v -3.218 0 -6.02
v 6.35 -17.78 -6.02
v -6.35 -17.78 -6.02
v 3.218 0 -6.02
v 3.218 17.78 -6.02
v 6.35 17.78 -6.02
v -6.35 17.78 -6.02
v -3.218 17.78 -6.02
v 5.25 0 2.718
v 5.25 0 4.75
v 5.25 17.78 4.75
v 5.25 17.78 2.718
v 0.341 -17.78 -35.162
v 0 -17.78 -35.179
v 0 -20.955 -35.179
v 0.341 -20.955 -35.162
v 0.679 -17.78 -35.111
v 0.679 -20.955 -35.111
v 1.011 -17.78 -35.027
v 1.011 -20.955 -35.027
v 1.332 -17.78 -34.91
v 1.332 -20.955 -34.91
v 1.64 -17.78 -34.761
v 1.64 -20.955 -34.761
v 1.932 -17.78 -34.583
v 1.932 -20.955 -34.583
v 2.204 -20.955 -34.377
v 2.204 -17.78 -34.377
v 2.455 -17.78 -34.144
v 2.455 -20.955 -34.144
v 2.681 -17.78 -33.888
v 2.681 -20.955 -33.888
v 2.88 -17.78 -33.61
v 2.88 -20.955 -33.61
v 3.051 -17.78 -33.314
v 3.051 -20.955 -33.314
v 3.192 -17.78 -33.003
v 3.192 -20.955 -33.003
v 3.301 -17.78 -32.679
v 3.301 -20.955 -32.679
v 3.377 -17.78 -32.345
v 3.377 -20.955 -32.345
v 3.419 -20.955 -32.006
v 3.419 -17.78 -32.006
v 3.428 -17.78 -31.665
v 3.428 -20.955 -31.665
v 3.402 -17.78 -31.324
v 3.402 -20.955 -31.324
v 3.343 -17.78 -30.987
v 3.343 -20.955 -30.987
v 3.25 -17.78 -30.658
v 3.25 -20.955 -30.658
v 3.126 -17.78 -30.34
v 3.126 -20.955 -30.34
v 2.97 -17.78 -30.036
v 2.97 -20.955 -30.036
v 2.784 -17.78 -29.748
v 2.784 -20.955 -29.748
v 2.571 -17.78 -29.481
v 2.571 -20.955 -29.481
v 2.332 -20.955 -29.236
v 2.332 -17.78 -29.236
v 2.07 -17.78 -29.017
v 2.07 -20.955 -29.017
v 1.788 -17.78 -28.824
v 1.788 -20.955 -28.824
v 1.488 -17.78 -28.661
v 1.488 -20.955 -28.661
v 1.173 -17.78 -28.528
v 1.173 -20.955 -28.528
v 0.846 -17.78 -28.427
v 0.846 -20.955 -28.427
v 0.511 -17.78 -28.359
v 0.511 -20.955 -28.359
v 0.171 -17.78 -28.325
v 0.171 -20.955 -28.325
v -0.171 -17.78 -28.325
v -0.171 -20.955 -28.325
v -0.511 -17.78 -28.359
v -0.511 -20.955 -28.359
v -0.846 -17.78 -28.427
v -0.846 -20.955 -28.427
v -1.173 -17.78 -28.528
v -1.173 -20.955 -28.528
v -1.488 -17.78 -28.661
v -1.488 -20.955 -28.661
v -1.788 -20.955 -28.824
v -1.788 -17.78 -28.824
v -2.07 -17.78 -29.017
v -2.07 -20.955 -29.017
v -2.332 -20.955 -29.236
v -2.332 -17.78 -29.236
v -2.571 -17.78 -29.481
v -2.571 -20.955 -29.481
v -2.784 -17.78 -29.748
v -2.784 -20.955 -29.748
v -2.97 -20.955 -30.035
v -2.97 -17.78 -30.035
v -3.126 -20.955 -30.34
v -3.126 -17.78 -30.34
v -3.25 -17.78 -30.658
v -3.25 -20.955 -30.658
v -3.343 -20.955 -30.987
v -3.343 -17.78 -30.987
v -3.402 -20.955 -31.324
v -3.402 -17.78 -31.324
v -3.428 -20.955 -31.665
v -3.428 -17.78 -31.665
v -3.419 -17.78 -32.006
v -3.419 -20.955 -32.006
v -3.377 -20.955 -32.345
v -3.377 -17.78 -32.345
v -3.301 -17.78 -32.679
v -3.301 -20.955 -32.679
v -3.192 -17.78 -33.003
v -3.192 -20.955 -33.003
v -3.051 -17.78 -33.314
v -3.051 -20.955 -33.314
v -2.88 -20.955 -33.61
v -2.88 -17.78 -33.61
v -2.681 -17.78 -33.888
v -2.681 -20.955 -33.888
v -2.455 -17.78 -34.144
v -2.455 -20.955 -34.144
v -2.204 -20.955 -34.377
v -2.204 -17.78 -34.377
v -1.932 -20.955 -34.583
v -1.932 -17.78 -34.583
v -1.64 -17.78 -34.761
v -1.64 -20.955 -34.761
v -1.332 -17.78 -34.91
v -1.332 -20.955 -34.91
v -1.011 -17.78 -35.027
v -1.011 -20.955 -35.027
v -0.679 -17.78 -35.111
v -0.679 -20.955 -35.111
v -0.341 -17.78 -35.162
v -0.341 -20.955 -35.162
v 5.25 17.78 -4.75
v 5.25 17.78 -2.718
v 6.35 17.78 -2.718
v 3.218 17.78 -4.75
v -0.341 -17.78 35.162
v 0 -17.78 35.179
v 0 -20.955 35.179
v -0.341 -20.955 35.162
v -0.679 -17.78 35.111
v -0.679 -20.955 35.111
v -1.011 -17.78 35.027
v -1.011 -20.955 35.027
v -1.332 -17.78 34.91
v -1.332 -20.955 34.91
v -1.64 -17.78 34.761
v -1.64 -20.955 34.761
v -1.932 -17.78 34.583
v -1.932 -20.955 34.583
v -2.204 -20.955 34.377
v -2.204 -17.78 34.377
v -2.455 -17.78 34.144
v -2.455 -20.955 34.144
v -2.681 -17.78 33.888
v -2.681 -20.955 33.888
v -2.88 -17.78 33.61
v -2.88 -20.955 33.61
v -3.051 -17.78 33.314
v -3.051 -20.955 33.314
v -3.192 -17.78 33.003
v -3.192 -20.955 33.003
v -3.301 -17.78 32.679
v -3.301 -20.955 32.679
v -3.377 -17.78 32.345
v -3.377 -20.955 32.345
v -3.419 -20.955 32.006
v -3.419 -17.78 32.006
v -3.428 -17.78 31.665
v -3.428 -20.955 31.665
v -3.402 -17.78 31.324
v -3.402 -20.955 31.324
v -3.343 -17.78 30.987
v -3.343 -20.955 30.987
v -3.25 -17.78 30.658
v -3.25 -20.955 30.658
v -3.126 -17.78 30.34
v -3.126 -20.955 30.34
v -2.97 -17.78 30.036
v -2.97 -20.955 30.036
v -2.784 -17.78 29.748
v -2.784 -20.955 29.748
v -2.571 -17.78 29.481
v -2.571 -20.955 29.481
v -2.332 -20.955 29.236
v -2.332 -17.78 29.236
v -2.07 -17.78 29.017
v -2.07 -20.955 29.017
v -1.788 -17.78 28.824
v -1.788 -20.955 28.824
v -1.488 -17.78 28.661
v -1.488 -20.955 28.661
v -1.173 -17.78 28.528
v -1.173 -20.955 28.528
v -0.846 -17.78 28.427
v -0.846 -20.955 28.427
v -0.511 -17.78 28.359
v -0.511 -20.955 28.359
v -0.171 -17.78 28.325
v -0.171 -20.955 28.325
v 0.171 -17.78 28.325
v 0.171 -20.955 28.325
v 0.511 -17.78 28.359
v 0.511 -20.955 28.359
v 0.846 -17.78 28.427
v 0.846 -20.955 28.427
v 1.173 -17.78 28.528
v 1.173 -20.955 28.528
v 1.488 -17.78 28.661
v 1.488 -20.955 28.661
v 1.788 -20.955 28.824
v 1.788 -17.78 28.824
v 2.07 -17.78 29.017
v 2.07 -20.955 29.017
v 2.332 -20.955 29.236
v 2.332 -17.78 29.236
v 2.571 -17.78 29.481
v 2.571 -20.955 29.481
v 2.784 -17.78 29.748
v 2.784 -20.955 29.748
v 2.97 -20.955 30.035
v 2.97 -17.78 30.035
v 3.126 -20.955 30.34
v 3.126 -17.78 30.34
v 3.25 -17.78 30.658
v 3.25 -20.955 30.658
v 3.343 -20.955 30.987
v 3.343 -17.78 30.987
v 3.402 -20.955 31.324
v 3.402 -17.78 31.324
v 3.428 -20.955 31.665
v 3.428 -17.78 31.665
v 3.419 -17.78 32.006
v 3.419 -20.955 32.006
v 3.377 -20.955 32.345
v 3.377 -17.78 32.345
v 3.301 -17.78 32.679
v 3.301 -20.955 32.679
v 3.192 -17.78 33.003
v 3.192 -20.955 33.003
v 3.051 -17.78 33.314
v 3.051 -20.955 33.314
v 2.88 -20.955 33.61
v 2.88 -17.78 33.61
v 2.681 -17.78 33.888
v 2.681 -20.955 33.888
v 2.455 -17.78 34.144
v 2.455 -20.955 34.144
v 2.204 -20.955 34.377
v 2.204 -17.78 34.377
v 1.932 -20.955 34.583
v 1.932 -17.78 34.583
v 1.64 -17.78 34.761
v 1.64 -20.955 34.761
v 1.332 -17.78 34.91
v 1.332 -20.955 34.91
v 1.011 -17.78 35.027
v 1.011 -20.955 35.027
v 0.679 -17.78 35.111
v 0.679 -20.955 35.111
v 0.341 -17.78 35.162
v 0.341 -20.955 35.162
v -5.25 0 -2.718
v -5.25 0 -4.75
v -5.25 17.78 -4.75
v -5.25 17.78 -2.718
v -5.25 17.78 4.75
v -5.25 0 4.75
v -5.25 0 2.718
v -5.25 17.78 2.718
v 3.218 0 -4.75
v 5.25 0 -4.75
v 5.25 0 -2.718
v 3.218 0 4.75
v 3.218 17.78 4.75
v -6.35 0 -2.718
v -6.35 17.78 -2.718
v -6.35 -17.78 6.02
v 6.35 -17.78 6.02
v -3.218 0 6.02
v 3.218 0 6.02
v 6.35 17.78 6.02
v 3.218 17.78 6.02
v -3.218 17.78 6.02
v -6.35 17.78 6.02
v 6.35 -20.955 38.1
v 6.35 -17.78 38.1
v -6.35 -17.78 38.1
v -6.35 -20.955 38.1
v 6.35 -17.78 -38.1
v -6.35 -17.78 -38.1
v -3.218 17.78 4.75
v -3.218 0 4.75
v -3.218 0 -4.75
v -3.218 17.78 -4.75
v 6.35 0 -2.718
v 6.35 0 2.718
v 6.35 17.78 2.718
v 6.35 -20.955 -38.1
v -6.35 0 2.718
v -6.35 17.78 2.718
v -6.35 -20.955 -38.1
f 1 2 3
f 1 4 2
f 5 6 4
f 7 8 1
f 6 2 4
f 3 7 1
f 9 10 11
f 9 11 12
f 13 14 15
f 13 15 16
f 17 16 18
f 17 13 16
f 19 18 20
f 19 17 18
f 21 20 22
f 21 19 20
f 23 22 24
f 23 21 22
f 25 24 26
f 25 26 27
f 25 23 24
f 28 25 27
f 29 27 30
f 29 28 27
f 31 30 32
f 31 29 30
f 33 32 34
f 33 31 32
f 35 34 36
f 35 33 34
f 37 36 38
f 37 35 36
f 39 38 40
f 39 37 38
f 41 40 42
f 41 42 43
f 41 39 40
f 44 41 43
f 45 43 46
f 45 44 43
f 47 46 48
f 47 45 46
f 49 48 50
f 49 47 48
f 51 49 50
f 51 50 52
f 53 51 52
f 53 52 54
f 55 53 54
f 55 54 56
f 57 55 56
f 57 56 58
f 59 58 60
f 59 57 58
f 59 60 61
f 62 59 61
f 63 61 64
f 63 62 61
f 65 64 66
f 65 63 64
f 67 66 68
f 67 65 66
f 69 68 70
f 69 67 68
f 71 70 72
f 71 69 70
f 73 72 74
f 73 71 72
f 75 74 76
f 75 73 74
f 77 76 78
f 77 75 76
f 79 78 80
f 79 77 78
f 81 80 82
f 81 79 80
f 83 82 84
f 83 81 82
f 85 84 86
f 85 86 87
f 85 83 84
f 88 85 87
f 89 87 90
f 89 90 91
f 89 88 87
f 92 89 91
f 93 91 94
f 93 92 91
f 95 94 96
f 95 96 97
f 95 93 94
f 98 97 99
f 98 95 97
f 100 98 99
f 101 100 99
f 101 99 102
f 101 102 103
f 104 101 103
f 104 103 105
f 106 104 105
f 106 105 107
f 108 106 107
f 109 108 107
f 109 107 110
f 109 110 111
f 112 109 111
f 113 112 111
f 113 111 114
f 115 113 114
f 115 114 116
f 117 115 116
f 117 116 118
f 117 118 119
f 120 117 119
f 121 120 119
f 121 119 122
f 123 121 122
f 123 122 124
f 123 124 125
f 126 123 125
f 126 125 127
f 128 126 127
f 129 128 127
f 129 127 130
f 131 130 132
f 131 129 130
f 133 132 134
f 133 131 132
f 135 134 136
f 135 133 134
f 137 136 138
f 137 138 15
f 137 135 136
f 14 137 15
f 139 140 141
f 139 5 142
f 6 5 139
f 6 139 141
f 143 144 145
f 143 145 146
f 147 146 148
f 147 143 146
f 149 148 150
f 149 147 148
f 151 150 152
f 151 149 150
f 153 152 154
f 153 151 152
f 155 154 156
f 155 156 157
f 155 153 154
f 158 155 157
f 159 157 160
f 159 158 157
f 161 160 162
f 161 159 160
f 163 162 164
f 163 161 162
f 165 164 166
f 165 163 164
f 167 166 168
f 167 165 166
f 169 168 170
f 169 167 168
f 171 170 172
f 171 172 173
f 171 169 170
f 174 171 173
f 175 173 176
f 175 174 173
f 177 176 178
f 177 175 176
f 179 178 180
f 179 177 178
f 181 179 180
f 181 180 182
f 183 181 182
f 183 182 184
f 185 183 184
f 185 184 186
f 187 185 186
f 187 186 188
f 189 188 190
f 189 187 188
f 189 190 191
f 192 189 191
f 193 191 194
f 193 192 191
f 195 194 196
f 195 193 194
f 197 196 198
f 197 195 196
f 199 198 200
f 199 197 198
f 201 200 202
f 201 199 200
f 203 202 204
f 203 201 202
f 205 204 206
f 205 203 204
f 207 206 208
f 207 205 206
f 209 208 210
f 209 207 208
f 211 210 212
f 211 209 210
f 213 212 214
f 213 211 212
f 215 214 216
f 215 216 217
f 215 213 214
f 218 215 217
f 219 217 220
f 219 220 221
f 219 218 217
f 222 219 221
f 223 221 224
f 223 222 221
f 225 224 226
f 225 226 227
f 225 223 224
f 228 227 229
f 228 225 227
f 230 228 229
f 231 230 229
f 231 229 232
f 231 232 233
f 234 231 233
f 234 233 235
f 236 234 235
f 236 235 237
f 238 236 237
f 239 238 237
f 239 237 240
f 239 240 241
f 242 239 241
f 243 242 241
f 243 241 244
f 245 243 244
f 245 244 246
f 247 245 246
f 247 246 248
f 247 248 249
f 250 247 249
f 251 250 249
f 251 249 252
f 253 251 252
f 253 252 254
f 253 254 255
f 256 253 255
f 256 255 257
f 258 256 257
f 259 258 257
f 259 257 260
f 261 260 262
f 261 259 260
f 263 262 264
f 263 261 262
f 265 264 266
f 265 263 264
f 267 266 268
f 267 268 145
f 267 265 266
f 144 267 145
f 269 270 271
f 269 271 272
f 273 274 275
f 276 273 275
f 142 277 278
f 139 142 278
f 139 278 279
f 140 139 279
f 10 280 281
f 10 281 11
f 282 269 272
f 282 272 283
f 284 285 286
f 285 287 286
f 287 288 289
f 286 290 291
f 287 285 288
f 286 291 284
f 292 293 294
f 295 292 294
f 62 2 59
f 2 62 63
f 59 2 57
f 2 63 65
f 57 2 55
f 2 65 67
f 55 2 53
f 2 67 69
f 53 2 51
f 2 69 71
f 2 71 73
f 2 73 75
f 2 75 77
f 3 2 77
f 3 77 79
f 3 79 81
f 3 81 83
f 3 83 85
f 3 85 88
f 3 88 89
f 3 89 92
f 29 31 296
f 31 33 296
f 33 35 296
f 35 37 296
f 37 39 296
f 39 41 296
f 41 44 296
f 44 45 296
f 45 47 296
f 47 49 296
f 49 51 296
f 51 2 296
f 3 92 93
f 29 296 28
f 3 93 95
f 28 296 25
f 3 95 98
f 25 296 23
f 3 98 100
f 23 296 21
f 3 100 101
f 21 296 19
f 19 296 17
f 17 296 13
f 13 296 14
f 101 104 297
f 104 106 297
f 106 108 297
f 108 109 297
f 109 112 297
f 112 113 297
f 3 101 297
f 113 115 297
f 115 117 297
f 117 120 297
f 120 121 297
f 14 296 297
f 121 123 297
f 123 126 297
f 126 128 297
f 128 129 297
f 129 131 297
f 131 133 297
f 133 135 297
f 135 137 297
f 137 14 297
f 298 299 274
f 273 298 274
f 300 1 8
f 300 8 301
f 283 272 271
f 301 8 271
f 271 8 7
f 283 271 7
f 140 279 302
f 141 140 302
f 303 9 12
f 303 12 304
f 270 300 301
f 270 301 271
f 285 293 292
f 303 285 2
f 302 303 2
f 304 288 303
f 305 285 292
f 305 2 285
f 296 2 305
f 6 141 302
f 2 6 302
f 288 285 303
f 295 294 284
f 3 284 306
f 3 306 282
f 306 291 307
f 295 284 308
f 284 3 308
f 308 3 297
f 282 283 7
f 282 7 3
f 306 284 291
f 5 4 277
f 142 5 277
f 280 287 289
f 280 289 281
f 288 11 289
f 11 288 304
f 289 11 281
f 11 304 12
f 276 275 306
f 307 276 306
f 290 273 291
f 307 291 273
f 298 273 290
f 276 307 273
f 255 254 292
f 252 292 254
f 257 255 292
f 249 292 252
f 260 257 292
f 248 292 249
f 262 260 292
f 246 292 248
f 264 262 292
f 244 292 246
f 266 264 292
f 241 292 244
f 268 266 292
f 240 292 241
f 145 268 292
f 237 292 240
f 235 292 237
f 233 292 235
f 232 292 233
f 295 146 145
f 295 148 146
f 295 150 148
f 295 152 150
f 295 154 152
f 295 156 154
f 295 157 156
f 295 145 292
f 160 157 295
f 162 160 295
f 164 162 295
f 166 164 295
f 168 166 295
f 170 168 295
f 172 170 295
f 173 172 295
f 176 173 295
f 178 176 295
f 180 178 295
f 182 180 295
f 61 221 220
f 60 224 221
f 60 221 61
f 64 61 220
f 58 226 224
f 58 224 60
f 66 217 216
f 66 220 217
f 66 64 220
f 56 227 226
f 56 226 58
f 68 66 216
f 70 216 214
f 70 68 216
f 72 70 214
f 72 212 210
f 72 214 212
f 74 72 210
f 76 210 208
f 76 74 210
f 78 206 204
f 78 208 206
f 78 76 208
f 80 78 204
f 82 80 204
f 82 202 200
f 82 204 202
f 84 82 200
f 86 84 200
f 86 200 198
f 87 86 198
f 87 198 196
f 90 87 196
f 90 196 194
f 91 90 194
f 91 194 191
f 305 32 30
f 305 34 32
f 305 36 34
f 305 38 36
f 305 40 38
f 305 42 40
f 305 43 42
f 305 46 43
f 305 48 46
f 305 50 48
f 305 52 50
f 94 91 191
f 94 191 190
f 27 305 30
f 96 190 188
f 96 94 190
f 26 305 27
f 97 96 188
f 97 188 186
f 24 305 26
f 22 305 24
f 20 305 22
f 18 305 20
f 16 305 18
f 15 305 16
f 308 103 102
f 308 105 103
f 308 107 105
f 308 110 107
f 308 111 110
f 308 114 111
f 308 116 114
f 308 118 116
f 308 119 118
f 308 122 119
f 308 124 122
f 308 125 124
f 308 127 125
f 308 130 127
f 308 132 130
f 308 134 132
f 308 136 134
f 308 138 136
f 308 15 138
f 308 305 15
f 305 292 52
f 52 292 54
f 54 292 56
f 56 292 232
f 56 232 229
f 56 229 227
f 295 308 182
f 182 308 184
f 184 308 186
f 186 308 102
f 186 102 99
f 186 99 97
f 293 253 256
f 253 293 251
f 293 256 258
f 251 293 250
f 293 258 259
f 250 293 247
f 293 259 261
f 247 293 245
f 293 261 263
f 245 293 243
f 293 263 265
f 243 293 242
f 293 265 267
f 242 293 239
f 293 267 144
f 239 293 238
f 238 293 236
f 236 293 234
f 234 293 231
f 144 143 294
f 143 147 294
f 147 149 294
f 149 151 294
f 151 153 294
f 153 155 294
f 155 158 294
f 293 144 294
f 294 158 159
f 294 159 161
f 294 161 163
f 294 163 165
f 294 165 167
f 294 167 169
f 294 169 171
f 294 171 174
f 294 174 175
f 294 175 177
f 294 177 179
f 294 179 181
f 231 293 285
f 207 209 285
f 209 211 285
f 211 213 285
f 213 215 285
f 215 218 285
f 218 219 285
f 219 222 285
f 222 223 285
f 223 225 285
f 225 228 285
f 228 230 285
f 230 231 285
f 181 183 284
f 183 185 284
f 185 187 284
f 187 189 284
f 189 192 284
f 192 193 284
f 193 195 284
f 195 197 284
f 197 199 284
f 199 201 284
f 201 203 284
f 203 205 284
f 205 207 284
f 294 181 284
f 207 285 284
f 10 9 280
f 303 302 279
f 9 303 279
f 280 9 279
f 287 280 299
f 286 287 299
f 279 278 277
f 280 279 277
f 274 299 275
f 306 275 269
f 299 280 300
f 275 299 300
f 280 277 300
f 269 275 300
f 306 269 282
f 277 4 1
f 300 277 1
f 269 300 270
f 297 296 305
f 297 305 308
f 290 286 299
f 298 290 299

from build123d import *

# Parameters (mm, degrees)
BOSS_EXTRUDE1_DEPTH   = 17.78
BOSS_EXTRUDE1_2_DEPTH = 17.78
BOSS_EXTRUDE1_3_DEPTH = 17.78
BOSS_EXTRUDE1_4_DEPTH = 17.78
SKETCH2_W             = 13.04
SKETCH2_H             = 12.04
BOSS_EXTRUDE2_DEPTH   = 17.78
SKETCH3_W             = 12.7
SKETCH3_H             = 76.2
SKETCH3_R             = 3.429
BOSS_EXTRUDE3_DEPTH   = 3.175
SKETCH4_OUTSIDE_W     = 32.334
SKETCH4_OUTSIDE_H     = 95.494
SKETCH4_OUTSIDE_W_2   = 12.7
SKETCH4_OUTSIDE_H_2   = 76.2
CUT_EXTRUDE2_DEPTH    = 55.722213268


with BuildPart() as part:
    # Sketch1 → Boss-Extrude1 (new body)
    with BuildSketch(Plane(origin=(0, 0, 0), x_dir=(1, 0, 0), z_dir=(0, 1, 0))):
        Polygon((-5.25, 4.75), (-5.25, 2.718), (-6.52, 2.718), (-6.52, 6.02), (-3.218, 6.02), (-3.218, 4.75), align=None)
    extrude(amount=BOSS_EXTRUDE1_DEPTH)



with BuildPart() as body_2:
    # Sketch1 → Boss-Extrude1 2 (new body)
    with BuildSketch(Plane(origin=(0, 0, 0), x_dir=(1, 0, 0), z_dir=(0, 1, 0))):
        Polygon((6.52, 2.718), (6.52, 6.02), (3.218, 6.02), (3.218, 4.75), (5.25, 4.75), (5.25, 2.718), align=None)
    extrude(amount=BOSS_EXTRUDE1_2_DEPTH)


with BuildPart() as body_3:
    # Sketch1 → Boss-Extrude1 3 (new body)
    with BuildSketch(Plane(origin=(0, 0, 0), x_dir=(1, 0, 0), z_dir=(0, 1, 0))):
        Polygon((5.25, -2.718), (6.52, -2.718), (6.52, -6.02), (3.218, -6.02), (3.218, -4.75), (5.25, -4.75), align=None)
    extrude(amount=BOSS_EXTRUDE1_3_DEPTH)


with BuildPart() as body_4:
    # Sketch1 → Boss-Extrude1 4 (new body)
    with BuildSketch(Plane(origin=(0, 0, 0), x_dir=(1, 0, 0), z_dir=(0, 1, 0))):
        Polygon((-5.25, -2.718), (-6.52, -2.718), (-6.52, -6.02), (-3.218, -6.02), (-3.218, -4.75), (-5.25, -4.75), align=None)
    extrude(amount=BOSS_EXTRUDE1_4_DEPTH)


with BuildPart() as part_1:
    add(part.part)

    add(body_2.part)  # Boss-Extrude2 merges body 2

    add(body_3.part)  # Boss-Extrude2 merges body 3

    add(body_4.part)  # Boss-Extrude2 merges body 4
    # Sketch2 → Boss-Extrude2 (add)
    with BuildSketch(Plane(origin=(0, 0, 0), x_dir=(-1, 0, 0), z_dir=(0, -1, 0))):
        Rectangle(SKETCH2_W, SKETCH2_H)
    extrude(amount=BOSS_EXTRUDE2_DEPTH)

    # Sketch3 → Boss-Extrude3 (add)
    with BuildSketch(Plane(origin=(0, -17.78, 0), x_dir=(-1, 0, 0), z_dir=(0, -1, 0))):
        Rectangle(SKETCH3_W, SKETCH3_H)
        with Locations(Location((0, 31.75, 0), (0, 0, 90))):
            Circle(SKETCH3_R, mode=Mode.SUBTRACT)
        with Locations(Location((0, -31.75, 0), (0, 0, 270))):
            Circle(SKETCH3_R, mode=Mode.SUBTRACT)
    extrude(amount=BOSS_EXTRUDE3_DEPTH)

    # Sketch4 outside → Cut-Extrude2 (cut, through all)
    with BuildSketch(Plane.XZ.offset(20.955)):
        Rectangle(SKETCH4_OUTSIDE_W, SKETCH4_OUTSIDE_H)
        Rectangle(SKETCH4_OUTSIDE_W_2, SKETCH4_OUTSIDE_H_2, mode=Mode.SUBTRACT)
    extrude(amount=-CUT_EXTRUDE2_DEPTH, mode=Mode.SUBTRACT)


solid = part_1.part
